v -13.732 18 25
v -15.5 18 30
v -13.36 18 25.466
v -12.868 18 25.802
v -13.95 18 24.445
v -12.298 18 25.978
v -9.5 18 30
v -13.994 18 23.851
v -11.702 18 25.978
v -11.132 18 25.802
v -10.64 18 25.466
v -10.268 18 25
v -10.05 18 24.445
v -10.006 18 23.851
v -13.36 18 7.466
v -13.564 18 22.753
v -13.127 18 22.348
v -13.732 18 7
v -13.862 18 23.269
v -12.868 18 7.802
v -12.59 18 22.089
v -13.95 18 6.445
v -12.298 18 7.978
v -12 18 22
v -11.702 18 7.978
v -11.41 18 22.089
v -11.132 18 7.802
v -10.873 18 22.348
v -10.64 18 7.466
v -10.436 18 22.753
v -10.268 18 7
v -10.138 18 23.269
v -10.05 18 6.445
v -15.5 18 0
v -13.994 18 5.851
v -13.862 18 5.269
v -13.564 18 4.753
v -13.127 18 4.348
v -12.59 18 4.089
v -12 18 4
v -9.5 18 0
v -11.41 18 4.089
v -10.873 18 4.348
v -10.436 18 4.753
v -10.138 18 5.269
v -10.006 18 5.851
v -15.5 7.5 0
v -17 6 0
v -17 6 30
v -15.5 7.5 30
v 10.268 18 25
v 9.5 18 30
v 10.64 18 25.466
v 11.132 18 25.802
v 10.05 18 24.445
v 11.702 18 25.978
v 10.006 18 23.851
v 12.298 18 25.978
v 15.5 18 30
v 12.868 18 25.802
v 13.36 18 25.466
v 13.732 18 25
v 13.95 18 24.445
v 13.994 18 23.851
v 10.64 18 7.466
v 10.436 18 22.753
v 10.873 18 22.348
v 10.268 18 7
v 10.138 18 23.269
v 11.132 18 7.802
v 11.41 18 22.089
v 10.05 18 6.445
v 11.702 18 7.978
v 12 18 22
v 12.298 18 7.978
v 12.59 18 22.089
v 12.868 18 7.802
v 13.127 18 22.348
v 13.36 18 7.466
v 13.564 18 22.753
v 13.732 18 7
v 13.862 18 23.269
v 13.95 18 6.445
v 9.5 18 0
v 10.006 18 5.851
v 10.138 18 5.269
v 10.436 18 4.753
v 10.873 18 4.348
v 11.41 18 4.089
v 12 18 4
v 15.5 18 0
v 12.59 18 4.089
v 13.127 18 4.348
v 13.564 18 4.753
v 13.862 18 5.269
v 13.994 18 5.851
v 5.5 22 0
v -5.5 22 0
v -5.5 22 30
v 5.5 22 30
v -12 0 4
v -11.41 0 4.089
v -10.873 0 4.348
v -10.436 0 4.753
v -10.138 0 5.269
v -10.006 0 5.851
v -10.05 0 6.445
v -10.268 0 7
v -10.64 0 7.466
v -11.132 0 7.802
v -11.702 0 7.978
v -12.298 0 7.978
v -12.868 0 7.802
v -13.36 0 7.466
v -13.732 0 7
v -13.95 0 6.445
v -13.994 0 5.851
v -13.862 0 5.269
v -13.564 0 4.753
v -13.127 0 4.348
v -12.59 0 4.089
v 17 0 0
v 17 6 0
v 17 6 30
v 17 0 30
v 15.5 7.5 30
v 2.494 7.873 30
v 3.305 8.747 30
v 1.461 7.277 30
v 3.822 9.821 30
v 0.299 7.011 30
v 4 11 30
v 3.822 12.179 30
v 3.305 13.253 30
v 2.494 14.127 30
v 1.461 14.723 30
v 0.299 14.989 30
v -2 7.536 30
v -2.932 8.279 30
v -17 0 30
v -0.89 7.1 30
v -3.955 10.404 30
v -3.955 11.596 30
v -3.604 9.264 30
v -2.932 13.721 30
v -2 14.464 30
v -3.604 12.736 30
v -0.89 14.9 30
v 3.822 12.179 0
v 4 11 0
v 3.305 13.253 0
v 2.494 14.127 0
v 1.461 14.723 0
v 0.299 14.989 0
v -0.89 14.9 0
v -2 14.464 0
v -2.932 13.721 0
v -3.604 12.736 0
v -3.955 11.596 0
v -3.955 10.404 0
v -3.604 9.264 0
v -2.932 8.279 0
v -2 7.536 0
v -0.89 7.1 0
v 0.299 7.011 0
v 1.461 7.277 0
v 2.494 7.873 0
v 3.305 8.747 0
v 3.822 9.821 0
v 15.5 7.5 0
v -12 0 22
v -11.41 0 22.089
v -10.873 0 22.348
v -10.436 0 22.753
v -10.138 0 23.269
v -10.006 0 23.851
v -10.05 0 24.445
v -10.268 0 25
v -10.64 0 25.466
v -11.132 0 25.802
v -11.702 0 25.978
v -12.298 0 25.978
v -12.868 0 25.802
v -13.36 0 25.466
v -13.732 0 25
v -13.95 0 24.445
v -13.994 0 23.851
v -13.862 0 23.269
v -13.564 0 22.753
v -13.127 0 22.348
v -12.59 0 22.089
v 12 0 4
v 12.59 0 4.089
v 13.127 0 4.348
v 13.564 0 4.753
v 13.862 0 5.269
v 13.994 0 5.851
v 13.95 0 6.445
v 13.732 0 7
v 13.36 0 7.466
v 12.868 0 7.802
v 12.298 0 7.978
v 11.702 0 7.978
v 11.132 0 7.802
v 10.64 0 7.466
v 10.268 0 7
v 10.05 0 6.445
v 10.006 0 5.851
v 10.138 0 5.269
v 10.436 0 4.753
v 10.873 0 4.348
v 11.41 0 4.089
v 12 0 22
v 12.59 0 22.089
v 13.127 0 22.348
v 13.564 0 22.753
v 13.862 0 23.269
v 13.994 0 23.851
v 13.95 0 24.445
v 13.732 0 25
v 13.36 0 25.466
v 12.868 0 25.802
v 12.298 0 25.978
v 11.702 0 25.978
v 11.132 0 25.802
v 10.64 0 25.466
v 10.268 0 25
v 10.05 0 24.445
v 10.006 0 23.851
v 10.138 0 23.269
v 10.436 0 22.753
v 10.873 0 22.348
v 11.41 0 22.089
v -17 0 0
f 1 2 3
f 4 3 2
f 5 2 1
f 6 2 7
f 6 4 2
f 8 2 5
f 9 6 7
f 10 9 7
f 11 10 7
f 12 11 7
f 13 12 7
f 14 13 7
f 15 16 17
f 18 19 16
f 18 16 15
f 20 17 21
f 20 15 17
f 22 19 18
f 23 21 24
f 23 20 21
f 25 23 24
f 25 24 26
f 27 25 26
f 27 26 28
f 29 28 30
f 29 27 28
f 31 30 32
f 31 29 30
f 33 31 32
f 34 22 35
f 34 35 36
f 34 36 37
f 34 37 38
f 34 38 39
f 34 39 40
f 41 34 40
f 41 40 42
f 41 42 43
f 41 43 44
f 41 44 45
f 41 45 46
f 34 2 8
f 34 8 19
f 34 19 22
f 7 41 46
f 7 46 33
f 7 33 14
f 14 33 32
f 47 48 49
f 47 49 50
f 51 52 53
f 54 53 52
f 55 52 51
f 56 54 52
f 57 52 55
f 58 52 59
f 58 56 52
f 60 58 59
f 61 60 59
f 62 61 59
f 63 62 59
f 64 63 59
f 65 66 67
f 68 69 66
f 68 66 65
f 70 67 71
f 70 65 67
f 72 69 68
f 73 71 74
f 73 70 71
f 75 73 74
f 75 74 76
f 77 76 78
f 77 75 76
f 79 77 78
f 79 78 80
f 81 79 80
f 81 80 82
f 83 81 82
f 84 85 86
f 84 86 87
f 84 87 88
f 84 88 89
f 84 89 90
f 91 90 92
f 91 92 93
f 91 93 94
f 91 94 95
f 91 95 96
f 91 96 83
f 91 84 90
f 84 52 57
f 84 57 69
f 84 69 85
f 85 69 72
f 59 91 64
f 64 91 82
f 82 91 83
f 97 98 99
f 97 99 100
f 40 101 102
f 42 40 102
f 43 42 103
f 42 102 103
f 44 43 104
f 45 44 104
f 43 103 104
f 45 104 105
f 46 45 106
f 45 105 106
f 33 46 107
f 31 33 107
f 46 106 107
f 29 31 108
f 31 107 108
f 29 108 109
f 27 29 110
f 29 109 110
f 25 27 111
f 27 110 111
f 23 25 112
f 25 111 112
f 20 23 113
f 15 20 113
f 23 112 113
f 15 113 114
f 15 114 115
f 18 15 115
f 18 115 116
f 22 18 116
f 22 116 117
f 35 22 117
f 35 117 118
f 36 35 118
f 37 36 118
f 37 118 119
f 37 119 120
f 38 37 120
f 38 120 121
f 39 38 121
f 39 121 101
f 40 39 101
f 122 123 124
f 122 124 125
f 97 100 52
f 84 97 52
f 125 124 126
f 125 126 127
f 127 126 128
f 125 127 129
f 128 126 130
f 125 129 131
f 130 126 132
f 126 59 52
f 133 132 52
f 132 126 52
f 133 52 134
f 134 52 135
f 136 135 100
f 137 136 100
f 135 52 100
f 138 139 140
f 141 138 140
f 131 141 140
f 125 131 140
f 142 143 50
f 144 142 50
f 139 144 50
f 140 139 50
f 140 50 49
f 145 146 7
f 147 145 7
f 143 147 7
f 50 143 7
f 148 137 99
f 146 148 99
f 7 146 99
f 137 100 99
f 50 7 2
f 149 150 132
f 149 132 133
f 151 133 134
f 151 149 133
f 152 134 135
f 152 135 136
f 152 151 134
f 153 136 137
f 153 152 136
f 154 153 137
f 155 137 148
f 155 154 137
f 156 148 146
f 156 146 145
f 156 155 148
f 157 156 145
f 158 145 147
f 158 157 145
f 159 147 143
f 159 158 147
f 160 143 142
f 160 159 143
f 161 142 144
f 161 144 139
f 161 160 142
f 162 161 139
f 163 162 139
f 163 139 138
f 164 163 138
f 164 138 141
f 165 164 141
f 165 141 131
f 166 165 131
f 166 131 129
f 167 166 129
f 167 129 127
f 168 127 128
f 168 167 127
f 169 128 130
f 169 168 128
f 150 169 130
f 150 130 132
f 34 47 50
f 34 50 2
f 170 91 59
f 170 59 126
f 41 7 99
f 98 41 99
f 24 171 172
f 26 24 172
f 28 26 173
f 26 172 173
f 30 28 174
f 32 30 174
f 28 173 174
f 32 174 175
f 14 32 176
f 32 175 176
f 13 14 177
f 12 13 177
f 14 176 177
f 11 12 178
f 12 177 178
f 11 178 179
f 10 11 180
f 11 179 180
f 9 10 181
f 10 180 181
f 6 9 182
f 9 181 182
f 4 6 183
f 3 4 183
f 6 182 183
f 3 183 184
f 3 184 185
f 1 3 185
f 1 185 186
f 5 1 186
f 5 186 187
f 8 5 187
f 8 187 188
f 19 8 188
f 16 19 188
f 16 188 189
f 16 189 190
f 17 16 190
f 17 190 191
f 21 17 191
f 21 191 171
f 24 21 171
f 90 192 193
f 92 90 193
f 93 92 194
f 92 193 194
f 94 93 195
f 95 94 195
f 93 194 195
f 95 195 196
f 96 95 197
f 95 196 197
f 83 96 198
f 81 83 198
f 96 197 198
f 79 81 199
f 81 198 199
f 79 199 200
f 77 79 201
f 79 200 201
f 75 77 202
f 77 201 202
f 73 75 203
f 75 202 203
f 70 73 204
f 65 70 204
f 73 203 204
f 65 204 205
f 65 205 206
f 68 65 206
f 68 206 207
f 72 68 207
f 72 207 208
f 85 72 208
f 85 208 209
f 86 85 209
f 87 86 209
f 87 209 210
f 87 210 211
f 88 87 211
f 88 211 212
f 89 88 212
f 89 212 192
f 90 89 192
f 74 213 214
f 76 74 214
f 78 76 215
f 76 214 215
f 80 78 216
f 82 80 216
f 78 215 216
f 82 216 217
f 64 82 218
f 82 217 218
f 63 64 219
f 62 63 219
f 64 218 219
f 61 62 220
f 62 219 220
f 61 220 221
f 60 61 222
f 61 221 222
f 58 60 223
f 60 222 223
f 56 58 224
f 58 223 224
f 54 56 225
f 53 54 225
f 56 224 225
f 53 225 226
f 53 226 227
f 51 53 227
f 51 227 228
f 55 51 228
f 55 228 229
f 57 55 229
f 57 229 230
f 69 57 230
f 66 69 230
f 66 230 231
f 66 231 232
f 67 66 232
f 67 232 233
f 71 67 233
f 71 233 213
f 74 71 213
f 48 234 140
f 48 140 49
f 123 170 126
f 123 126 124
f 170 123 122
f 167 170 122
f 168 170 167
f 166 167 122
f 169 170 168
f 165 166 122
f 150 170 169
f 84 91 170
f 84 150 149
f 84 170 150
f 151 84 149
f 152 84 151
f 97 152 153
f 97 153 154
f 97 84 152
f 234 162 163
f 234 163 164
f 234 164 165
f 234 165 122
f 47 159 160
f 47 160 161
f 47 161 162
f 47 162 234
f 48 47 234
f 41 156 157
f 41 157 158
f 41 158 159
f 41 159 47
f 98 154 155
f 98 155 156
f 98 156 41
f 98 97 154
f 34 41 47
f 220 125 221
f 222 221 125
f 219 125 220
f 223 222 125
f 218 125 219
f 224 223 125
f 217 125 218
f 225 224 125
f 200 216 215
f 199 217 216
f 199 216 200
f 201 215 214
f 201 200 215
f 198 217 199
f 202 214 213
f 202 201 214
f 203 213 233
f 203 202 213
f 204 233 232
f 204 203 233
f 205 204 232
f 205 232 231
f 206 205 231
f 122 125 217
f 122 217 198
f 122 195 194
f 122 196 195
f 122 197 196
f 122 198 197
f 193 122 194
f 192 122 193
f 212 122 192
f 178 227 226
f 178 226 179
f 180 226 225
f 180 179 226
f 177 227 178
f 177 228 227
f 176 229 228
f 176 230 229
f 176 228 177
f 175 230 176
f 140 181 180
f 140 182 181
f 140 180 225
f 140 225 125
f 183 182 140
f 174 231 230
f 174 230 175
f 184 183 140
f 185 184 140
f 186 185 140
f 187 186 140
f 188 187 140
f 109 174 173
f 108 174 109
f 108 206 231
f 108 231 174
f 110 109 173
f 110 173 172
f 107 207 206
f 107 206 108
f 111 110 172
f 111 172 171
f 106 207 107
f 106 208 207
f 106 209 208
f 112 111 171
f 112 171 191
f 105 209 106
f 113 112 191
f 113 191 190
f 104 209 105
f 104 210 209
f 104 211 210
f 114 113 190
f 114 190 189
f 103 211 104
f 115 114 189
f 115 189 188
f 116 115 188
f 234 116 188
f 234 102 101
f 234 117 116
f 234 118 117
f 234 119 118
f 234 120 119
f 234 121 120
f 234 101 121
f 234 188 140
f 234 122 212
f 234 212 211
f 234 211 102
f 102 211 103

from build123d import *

# Parameters (mm, degrees)
SKETCH_1_R          = 4
EXTRUDE_1_DEPTH     = 30
SKETCH_3_R          = 2
CUT_EXTRUDE_1_DEPTH = 41.902322672


with BuildPart() as part:
    # 草图1 → 凸台-拉伸1 (new body)
    with BuildSketch(Plane.XY):
        Polygon((17, 0), (-17, 0), (-17, 6), (-15.5, 7.5), (-15.5, 18), (-9.5, 18), (-5.5, 22), (5.5, 22), (9.5, 18), (15.5, 18), (15.5, 7.5), (17, 6), align=None)
        with Locations((0, 11)):
            Circle(SKETCH_1_R, mode=Mode.SUBTRACT)
    extrude(amount=EXTRUDE_1_DEPTH)

    # 草图3 → 切除-拉伸1 (cut, through all)
    with BuildSketch(Plane.XZ):
        with Locations(Location((12, 24, 0), (0, 0, 270))):
            Circle(SKETCH_3_R)
        with Locations(Location((-12, 24, 0), (0, 0, 270))):
            Circle(SKETCH_3_R)
        with Locations(Location((-12, 6, 0), (0, 0, 270))):
            Circle(SKETCH_3_R)
        with Locations(Location((12, 6, 0), (0, 0, 270))):
            Circle(SKETCH_3_R)
    extrude(amount=-CUT_EXTRUDE_1_DEPTH, mode=Mode.SUBTRACT)


solid = part.part
